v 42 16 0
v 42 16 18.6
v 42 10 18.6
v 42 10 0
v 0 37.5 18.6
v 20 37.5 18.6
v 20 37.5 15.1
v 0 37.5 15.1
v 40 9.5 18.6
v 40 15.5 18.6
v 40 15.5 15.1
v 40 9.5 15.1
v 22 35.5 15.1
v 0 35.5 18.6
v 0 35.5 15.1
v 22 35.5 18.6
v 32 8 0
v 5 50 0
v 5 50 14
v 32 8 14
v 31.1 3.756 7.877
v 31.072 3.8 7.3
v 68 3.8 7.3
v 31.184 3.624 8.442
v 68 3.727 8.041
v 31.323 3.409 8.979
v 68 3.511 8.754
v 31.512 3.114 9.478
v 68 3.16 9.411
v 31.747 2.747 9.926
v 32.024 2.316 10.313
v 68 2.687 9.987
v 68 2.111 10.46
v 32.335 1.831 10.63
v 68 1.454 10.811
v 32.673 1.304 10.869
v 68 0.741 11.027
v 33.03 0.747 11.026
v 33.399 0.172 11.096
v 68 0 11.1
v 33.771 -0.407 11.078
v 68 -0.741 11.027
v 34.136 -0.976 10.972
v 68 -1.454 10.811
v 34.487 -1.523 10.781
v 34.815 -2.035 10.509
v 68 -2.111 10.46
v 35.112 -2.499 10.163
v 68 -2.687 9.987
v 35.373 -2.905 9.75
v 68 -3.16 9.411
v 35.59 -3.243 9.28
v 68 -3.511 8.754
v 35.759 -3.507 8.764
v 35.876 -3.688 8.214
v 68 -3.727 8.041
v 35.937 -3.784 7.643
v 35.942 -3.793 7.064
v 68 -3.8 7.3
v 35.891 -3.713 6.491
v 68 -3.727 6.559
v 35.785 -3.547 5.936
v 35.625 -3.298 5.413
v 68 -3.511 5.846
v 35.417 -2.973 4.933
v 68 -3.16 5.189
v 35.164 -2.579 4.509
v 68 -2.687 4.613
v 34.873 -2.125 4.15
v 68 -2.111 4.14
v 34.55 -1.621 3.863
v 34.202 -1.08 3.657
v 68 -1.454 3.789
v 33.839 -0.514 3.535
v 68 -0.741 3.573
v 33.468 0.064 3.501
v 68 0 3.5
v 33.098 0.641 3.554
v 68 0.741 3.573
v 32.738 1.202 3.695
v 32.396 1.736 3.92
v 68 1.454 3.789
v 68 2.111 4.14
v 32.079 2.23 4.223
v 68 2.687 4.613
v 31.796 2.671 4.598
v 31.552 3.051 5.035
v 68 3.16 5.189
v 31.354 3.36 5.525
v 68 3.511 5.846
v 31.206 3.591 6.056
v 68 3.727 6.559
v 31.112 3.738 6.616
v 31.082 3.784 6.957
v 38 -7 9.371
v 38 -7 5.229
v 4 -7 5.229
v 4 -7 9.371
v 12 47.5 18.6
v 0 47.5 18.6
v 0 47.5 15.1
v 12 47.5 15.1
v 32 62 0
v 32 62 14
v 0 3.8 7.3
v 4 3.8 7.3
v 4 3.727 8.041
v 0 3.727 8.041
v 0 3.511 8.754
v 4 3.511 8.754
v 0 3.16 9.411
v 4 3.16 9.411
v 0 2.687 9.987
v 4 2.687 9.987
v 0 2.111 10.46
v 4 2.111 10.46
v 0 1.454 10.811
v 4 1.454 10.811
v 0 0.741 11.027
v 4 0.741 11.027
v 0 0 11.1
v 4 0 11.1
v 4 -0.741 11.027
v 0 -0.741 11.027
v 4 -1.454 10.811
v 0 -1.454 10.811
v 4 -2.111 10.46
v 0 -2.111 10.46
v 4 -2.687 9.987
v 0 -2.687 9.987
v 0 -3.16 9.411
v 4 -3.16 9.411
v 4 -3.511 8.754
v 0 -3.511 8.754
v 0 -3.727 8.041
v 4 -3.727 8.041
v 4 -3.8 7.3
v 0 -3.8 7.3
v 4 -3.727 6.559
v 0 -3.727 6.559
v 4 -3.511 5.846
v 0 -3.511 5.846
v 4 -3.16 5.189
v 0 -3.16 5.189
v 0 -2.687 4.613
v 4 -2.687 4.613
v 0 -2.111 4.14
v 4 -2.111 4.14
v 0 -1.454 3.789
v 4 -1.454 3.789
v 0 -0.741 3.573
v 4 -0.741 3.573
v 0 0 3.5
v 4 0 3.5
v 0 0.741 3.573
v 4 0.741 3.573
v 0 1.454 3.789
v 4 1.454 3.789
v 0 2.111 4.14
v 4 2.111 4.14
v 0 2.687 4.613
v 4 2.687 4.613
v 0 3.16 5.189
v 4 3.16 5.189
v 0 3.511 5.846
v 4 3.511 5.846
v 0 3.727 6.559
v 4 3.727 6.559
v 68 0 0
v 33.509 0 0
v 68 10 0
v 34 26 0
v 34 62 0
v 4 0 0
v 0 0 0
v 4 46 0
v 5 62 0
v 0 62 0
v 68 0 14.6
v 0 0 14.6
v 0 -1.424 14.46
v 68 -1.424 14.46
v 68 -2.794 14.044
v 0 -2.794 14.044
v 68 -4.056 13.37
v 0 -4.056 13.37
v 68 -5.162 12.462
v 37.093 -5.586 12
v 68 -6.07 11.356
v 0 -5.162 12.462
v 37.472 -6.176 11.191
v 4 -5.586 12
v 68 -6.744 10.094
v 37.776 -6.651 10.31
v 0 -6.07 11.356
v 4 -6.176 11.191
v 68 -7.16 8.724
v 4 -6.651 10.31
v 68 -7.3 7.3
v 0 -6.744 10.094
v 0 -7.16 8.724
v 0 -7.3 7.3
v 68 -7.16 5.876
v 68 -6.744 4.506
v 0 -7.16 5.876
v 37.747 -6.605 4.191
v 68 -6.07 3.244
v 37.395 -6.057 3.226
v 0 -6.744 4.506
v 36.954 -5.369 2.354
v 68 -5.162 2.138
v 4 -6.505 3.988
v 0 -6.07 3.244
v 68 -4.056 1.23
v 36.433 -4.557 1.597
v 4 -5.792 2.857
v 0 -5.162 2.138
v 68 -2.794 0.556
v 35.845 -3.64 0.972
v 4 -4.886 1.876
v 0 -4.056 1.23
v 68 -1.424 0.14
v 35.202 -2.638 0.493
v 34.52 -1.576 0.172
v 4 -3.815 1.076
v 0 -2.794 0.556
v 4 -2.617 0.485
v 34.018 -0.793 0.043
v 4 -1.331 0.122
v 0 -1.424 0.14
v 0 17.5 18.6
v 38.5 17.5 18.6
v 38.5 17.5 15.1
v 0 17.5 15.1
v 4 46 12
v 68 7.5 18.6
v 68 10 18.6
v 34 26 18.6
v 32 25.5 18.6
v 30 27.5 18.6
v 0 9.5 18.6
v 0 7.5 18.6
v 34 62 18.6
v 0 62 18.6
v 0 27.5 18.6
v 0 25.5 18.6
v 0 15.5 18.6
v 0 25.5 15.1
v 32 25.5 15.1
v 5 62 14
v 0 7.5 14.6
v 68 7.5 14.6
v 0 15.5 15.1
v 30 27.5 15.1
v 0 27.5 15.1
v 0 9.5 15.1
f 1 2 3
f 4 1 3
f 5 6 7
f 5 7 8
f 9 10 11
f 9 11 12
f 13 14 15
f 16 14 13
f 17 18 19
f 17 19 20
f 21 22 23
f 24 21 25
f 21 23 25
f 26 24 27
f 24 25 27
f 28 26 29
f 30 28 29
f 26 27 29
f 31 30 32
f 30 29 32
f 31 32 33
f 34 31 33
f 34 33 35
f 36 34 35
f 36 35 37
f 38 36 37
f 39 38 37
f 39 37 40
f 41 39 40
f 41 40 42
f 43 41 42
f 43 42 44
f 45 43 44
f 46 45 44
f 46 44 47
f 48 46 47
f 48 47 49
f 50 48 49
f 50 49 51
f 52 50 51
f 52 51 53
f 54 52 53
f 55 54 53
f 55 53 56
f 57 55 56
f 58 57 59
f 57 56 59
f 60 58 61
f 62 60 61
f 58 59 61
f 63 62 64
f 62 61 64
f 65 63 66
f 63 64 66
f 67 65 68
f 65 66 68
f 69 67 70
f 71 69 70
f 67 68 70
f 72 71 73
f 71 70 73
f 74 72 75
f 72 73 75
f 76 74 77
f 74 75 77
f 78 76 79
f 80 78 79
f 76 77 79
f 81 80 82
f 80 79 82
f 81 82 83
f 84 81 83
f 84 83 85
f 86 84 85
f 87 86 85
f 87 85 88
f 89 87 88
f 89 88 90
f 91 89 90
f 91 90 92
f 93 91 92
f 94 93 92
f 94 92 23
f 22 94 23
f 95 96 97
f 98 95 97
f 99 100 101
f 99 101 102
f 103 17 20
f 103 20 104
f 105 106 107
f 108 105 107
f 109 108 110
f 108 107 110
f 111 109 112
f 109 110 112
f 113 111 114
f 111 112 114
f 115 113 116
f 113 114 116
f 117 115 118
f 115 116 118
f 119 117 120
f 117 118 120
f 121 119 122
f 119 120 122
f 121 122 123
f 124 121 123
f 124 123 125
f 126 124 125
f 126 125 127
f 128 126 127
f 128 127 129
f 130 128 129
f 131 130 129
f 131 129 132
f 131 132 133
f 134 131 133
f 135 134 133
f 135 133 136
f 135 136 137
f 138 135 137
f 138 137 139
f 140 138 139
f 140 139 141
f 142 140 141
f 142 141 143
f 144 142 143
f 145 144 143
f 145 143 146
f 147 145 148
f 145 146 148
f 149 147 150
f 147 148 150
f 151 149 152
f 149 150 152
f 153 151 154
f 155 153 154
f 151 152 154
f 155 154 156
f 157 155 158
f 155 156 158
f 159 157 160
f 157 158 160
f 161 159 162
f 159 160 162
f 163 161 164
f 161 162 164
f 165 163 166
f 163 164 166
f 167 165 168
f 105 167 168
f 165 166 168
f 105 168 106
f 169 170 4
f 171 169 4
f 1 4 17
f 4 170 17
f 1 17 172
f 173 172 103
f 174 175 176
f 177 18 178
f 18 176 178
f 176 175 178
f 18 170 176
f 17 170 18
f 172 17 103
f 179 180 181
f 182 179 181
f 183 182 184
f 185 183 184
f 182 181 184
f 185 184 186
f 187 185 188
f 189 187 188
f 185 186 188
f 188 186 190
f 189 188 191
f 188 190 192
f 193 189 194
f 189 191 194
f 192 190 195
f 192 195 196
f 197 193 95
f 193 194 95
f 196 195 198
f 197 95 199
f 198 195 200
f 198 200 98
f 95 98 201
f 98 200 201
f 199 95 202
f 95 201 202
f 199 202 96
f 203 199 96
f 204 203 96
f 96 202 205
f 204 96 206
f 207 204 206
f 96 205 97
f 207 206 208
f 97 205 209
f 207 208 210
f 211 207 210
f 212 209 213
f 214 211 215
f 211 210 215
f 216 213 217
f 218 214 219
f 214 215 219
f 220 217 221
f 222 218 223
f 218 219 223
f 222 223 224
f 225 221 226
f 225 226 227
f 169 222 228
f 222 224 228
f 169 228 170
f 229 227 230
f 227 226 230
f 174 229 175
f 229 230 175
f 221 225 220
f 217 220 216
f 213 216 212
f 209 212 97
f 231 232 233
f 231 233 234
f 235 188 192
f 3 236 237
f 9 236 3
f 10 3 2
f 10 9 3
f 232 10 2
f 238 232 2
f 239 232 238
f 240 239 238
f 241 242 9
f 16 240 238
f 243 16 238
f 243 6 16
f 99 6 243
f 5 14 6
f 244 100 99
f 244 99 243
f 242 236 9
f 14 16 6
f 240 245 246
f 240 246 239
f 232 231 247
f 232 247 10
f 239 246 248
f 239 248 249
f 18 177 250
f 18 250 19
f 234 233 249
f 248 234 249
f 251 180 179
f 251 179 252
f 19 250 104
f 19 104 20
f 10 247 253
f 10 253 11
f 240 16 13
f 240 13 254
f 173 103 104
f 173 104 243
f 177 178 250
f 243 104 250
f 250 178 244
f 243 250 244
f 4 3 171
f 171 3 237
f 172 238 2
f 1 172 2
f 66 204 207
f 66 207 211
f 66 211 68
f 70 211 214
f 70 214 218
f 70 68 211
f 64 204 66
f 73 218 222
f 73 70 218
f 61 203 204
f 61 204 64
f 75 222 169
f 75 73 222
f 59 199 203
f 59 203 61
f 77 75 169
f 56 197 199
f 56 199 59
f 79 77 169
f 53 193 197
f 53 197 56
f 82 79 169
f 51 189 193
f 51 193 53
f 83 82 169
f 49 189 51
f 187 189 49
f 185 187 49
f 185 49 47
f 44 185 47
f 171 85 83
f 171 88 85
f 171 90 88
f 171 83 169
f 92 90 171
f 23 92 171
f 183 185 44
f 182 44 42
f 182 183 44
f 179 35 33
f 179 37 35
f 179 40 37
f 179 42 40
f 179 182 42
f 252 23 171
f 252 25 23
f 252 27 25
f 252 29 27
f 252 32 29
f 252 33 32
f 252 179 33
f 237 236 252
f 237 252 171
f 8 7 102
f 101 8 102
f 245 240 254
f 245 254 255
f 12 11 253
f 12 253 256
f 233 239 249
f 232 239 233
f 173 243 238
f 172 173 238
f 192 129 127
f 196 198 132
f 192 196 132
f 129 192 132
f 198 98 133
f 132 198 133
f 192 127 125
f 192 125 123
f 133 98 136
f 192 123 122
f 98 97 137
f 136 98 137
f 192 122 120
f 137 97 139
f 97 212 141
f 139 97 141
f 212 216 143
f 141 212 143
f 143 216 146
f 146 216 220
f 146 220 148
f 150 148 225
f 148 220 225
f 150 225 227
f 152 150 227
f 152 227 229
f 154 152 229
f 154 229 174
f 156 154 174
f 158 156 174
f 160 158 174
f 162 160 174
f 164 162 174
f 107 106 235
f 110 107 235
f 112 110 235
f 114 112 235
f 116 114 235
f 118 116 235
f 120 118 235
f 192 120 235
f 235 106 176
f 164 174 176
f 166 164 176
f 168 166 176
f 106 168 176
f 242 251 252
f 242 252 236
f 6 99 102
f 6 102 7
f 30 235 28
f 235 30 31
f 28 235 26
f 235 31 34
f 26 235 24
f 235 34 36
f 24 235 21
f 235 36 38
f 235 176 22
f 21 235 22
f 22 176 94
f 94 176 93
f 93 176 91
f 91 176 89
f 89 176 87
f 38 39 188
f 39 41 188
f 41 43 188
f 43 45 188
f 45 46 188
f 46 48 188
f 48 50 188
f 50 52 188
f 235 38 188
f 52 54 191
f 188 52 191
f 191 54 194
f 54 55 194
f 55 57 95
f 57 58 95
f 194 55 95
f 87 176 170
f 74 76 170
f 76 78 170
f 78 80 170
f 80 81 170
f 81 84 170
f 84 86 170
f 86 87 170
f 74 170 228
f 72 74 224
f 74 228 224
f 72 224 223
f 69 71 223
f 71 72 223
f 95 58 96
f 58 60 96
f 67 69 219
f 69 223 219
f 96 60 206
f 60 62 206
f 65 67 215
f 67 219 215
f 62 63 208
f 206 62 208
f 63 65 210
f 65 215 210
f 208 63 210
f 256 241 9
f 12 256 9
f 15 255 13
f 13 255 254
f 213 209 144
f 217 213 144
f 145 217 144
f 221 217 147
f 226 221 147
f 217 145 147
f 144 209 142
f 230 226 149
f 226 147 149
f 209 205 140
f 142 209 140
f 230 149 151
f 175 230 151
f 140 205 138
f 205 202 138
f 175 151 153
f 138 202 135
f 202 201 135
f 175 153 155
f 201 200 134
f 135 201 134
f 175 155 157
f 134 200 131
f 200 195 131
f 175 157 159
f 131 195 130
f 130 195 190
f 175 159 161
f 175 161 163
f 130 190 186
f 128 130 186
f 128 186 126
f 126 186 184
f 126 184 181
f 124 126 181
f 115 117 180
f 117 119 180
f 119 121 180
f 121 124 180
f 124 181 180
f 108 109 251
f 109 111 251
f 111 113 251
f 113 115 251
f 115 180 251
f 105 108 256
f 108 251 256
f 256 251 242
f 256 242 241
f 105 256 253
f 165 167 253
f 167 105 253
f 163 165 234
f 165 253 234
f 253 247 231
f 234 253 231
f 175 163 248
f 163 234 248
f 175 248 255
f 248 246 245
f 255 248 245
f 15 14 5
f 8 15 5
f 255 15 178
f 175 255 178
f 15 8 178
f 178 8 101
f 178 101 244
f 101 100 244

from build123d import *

# Parameters (mm, degrees)
PAD_DEPTH       = 68
SKETCH001_R     = 3.8
POCKET_DEPTH    = 68.001
POCKET001_DEPTH = 18.601
SKETCH003_W     = 6
SKETCH003_H     = 40
POCKET002_DEPTH = 3.5
POCKET003_DEPTH = 12
POCKET004_DEPTH = 14


with BuildPart() as part:
    # Sketch → Pad (new body)
    with BuildSketch(Plane.YZ):
        with BuildLine():
            ThreePointArc((0, 14.6), (-7.3, 7.3), (0, 0))
            Line((0, 0), (62, 0))
            Line((62, 0), (62, 18.6))
            Line((7.5, 18.6), (62, 18.6))
            Line((7.5, 14.6), (7.5, 18.6))
            Line((0, 14.6), (7.5, 14.6))
        make_face()
    extrude(amount=PAD_DEPTH)

    # Sketch001 (on Face8 of Pad) → Pocket (cut, through all)
    with BuildSketch(Plane.YZ.offset(68)):
        with Locations((0, 7.3)):
            Circle(SKETCH001_R)
    extrude(amount=-POCKET_DEPTH, mode=Mode.SUBTRACT)

    # Sketch002 (on Face8 of Pocket) → Pocket001 (cut, through all)
    with BuildSketch(Plane(origin=(0, 0, 18.6), x_dir=(0, -1, 0), z_dir=(0, 0, 1))):
        Polygon((-62, 34), (-26, 34), (-16, 42), (-10, 42), (-10, 68), (-62, 68), align=None)
    extrude(amount=-POCKET001_DEPTH, mode=Mode.SUBTRACT)

    # Sketch003 (on Face12 of Pocket001) → Pocket002 (cut)
    with BuildSketch(Plane(origin=(0, 0, 18.6), x_dir=(0, -1, 0), z_dir=(0, 0, 1))):
        with Locations((-12.5, 20)):
            Rectangle(SKETCH003_W, SKETCH003_H)
        Polygon((-25.5, 0), (-25.5, 32), (-17.5, 38.5), (-17.5, 0), align=None)
        Polygon((-35.5, 0), (-35.5, 22), (-27.5, 30), (-27.5, 0), align=None)
        Polygon((-47.5, 0), (-47.5, 12), (-37.5, 20), (-37.5, 0), align=None)
    extrude(amount=-POCKET002_DEPTH, mode=Mode.SUBTRACT)

    # Sketch004 (on Face3 of Pocket002) → Pocket003 (cut)
    with BuildSketch(Plane.YX):
        Polygon((-7, 38), (-7, 4), (46, 4), align=None)
    extrude(amount=-POCKET003_DEPTH, mode=Mode.SUBTRACT)

    # Sketch005 (on Face3 of Pocket003) → Pocket004 (cut)
    with BuildSketch(Plane.YX):
        Polygon((8, 32), (62, 32), (62, 5), (50, 5), align=None)
    extrude(amount=-POCKET004_DEPTH, mode=Mode.SUBTRACT)


solid = part.part
